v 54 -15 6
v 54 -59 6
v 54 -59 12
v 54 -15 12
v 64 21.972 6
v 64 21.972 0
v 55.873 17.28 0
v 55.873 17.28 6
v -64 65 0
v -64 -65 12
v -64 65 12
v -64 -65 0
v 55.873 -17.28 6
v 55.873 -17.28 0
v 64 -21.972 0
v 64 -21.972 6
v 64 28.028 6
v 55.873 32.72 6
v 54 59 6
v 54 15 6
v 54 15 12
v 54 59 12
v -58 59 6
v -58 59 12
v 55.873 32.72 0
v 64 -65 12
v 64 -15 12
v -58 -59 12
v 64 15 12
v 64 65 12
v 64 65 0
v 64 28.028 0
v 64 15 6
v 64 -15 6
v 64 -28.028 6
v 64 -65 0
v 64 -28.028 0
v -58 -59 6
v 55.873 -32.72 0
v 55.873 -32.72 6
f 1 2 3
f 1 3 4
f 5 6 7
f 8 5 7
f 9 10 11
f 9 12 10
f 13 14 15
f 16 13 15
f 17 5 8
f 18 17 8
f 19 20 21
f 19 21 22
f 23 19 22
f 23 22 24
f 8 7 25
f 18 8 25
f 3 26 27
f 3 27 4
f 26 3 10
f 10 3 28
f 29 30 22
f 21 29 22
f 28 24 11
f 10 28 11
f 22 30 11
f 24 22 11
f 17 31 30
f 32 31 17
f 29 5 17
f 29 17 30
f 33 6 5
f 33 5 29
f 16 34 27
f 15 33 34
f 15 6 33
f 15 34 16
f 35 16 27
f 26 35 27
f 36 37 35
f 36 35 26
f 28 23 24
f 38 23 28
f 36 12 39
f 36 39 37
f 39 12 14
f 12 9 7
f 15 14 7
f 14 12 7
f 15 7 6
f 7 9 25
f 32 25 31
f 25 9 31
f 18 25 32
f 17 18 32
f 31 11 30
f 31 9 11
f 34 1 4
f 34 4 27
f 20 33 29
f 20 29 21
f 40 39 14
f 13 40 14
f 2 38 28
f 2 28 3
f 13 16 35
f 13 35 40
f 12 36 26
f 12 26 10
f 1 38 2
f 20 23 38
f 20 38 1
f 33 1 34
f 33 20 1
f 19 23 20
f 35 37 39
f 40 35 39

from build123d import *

# Parameters (mm, degrees)
SKETCH1_W           = 34
SKETCH1_H           = 34
BOSS_EXTRUDE1_DEPTH = 6
BOSS_EXTRUDE2_DEPTH = 6


with BuildPart() as part:
    # Sketch1 → Boss-Extrude1 (new body)
    # profile 1 of 4: a face of its own
    with BuildSketch(Plane.XY):
        Polygon((64, 21.972155185), (55.873, 17.280029547), (55.873, 32.719970453), (64, 28.027844815), (64, 65), (-64, 65), (-64, -65), (64, -65), (64, -28.027844815), (55.873, -32.719970453), (55.873, -17.280029547), (64, -21.972155185), align=None)
        with Locations((32, 0)):
            Rectangle(SKETCH1_W, SKETCH1_H, mode=Mode.SUBTRACT)
        with Locations((32, -40)):
            Rectangle(SKETCH1_W, SKETCH1_H, mode=Mode.SUBTRACT)
        with Locations((32, 40)):
            Rectangle(SKETCH1_W, SKETCH1_H, mode=Mode.SUBTRACT)
    # profile 2 of 4: a face of its own
    with BuildSketch(Plane.XY):
        with Locations((32, 0)):
            Rectangle(SKETCH1_W, SKETCH1_H)
    # profile 3 of 4: a face of its own
    with BuildSketch(Plane.XY):
        with Locations((32, 40)):
            Rectangle(SKETCH1_W, SKETCH1_H)
    # profile 4 of 4: a face of its own
    with BuildSketch(Plane.XY):
        with Locations((32, -40)):
            Rectangle(SKETCH1_W, SKETCH1_H)
    extrude(amount=BOSS_EXTRUDE1_DEPTH)

    # Sketch2 → Boss-Extrude2 (add)
    with BuildSketch(Plane.XY.offset(6)):
        Polygon((-64, 65), (64, 65), (64, 15), (54, 15), (54, 59), (-58, 59), (-58, -59), (54, -59), (54, -15), (64, -15), (64, -65), (-64, -65), align=None)
    extrude(amount=BOSS_EXTRUDE2_DEPTH)


solid = part.part
